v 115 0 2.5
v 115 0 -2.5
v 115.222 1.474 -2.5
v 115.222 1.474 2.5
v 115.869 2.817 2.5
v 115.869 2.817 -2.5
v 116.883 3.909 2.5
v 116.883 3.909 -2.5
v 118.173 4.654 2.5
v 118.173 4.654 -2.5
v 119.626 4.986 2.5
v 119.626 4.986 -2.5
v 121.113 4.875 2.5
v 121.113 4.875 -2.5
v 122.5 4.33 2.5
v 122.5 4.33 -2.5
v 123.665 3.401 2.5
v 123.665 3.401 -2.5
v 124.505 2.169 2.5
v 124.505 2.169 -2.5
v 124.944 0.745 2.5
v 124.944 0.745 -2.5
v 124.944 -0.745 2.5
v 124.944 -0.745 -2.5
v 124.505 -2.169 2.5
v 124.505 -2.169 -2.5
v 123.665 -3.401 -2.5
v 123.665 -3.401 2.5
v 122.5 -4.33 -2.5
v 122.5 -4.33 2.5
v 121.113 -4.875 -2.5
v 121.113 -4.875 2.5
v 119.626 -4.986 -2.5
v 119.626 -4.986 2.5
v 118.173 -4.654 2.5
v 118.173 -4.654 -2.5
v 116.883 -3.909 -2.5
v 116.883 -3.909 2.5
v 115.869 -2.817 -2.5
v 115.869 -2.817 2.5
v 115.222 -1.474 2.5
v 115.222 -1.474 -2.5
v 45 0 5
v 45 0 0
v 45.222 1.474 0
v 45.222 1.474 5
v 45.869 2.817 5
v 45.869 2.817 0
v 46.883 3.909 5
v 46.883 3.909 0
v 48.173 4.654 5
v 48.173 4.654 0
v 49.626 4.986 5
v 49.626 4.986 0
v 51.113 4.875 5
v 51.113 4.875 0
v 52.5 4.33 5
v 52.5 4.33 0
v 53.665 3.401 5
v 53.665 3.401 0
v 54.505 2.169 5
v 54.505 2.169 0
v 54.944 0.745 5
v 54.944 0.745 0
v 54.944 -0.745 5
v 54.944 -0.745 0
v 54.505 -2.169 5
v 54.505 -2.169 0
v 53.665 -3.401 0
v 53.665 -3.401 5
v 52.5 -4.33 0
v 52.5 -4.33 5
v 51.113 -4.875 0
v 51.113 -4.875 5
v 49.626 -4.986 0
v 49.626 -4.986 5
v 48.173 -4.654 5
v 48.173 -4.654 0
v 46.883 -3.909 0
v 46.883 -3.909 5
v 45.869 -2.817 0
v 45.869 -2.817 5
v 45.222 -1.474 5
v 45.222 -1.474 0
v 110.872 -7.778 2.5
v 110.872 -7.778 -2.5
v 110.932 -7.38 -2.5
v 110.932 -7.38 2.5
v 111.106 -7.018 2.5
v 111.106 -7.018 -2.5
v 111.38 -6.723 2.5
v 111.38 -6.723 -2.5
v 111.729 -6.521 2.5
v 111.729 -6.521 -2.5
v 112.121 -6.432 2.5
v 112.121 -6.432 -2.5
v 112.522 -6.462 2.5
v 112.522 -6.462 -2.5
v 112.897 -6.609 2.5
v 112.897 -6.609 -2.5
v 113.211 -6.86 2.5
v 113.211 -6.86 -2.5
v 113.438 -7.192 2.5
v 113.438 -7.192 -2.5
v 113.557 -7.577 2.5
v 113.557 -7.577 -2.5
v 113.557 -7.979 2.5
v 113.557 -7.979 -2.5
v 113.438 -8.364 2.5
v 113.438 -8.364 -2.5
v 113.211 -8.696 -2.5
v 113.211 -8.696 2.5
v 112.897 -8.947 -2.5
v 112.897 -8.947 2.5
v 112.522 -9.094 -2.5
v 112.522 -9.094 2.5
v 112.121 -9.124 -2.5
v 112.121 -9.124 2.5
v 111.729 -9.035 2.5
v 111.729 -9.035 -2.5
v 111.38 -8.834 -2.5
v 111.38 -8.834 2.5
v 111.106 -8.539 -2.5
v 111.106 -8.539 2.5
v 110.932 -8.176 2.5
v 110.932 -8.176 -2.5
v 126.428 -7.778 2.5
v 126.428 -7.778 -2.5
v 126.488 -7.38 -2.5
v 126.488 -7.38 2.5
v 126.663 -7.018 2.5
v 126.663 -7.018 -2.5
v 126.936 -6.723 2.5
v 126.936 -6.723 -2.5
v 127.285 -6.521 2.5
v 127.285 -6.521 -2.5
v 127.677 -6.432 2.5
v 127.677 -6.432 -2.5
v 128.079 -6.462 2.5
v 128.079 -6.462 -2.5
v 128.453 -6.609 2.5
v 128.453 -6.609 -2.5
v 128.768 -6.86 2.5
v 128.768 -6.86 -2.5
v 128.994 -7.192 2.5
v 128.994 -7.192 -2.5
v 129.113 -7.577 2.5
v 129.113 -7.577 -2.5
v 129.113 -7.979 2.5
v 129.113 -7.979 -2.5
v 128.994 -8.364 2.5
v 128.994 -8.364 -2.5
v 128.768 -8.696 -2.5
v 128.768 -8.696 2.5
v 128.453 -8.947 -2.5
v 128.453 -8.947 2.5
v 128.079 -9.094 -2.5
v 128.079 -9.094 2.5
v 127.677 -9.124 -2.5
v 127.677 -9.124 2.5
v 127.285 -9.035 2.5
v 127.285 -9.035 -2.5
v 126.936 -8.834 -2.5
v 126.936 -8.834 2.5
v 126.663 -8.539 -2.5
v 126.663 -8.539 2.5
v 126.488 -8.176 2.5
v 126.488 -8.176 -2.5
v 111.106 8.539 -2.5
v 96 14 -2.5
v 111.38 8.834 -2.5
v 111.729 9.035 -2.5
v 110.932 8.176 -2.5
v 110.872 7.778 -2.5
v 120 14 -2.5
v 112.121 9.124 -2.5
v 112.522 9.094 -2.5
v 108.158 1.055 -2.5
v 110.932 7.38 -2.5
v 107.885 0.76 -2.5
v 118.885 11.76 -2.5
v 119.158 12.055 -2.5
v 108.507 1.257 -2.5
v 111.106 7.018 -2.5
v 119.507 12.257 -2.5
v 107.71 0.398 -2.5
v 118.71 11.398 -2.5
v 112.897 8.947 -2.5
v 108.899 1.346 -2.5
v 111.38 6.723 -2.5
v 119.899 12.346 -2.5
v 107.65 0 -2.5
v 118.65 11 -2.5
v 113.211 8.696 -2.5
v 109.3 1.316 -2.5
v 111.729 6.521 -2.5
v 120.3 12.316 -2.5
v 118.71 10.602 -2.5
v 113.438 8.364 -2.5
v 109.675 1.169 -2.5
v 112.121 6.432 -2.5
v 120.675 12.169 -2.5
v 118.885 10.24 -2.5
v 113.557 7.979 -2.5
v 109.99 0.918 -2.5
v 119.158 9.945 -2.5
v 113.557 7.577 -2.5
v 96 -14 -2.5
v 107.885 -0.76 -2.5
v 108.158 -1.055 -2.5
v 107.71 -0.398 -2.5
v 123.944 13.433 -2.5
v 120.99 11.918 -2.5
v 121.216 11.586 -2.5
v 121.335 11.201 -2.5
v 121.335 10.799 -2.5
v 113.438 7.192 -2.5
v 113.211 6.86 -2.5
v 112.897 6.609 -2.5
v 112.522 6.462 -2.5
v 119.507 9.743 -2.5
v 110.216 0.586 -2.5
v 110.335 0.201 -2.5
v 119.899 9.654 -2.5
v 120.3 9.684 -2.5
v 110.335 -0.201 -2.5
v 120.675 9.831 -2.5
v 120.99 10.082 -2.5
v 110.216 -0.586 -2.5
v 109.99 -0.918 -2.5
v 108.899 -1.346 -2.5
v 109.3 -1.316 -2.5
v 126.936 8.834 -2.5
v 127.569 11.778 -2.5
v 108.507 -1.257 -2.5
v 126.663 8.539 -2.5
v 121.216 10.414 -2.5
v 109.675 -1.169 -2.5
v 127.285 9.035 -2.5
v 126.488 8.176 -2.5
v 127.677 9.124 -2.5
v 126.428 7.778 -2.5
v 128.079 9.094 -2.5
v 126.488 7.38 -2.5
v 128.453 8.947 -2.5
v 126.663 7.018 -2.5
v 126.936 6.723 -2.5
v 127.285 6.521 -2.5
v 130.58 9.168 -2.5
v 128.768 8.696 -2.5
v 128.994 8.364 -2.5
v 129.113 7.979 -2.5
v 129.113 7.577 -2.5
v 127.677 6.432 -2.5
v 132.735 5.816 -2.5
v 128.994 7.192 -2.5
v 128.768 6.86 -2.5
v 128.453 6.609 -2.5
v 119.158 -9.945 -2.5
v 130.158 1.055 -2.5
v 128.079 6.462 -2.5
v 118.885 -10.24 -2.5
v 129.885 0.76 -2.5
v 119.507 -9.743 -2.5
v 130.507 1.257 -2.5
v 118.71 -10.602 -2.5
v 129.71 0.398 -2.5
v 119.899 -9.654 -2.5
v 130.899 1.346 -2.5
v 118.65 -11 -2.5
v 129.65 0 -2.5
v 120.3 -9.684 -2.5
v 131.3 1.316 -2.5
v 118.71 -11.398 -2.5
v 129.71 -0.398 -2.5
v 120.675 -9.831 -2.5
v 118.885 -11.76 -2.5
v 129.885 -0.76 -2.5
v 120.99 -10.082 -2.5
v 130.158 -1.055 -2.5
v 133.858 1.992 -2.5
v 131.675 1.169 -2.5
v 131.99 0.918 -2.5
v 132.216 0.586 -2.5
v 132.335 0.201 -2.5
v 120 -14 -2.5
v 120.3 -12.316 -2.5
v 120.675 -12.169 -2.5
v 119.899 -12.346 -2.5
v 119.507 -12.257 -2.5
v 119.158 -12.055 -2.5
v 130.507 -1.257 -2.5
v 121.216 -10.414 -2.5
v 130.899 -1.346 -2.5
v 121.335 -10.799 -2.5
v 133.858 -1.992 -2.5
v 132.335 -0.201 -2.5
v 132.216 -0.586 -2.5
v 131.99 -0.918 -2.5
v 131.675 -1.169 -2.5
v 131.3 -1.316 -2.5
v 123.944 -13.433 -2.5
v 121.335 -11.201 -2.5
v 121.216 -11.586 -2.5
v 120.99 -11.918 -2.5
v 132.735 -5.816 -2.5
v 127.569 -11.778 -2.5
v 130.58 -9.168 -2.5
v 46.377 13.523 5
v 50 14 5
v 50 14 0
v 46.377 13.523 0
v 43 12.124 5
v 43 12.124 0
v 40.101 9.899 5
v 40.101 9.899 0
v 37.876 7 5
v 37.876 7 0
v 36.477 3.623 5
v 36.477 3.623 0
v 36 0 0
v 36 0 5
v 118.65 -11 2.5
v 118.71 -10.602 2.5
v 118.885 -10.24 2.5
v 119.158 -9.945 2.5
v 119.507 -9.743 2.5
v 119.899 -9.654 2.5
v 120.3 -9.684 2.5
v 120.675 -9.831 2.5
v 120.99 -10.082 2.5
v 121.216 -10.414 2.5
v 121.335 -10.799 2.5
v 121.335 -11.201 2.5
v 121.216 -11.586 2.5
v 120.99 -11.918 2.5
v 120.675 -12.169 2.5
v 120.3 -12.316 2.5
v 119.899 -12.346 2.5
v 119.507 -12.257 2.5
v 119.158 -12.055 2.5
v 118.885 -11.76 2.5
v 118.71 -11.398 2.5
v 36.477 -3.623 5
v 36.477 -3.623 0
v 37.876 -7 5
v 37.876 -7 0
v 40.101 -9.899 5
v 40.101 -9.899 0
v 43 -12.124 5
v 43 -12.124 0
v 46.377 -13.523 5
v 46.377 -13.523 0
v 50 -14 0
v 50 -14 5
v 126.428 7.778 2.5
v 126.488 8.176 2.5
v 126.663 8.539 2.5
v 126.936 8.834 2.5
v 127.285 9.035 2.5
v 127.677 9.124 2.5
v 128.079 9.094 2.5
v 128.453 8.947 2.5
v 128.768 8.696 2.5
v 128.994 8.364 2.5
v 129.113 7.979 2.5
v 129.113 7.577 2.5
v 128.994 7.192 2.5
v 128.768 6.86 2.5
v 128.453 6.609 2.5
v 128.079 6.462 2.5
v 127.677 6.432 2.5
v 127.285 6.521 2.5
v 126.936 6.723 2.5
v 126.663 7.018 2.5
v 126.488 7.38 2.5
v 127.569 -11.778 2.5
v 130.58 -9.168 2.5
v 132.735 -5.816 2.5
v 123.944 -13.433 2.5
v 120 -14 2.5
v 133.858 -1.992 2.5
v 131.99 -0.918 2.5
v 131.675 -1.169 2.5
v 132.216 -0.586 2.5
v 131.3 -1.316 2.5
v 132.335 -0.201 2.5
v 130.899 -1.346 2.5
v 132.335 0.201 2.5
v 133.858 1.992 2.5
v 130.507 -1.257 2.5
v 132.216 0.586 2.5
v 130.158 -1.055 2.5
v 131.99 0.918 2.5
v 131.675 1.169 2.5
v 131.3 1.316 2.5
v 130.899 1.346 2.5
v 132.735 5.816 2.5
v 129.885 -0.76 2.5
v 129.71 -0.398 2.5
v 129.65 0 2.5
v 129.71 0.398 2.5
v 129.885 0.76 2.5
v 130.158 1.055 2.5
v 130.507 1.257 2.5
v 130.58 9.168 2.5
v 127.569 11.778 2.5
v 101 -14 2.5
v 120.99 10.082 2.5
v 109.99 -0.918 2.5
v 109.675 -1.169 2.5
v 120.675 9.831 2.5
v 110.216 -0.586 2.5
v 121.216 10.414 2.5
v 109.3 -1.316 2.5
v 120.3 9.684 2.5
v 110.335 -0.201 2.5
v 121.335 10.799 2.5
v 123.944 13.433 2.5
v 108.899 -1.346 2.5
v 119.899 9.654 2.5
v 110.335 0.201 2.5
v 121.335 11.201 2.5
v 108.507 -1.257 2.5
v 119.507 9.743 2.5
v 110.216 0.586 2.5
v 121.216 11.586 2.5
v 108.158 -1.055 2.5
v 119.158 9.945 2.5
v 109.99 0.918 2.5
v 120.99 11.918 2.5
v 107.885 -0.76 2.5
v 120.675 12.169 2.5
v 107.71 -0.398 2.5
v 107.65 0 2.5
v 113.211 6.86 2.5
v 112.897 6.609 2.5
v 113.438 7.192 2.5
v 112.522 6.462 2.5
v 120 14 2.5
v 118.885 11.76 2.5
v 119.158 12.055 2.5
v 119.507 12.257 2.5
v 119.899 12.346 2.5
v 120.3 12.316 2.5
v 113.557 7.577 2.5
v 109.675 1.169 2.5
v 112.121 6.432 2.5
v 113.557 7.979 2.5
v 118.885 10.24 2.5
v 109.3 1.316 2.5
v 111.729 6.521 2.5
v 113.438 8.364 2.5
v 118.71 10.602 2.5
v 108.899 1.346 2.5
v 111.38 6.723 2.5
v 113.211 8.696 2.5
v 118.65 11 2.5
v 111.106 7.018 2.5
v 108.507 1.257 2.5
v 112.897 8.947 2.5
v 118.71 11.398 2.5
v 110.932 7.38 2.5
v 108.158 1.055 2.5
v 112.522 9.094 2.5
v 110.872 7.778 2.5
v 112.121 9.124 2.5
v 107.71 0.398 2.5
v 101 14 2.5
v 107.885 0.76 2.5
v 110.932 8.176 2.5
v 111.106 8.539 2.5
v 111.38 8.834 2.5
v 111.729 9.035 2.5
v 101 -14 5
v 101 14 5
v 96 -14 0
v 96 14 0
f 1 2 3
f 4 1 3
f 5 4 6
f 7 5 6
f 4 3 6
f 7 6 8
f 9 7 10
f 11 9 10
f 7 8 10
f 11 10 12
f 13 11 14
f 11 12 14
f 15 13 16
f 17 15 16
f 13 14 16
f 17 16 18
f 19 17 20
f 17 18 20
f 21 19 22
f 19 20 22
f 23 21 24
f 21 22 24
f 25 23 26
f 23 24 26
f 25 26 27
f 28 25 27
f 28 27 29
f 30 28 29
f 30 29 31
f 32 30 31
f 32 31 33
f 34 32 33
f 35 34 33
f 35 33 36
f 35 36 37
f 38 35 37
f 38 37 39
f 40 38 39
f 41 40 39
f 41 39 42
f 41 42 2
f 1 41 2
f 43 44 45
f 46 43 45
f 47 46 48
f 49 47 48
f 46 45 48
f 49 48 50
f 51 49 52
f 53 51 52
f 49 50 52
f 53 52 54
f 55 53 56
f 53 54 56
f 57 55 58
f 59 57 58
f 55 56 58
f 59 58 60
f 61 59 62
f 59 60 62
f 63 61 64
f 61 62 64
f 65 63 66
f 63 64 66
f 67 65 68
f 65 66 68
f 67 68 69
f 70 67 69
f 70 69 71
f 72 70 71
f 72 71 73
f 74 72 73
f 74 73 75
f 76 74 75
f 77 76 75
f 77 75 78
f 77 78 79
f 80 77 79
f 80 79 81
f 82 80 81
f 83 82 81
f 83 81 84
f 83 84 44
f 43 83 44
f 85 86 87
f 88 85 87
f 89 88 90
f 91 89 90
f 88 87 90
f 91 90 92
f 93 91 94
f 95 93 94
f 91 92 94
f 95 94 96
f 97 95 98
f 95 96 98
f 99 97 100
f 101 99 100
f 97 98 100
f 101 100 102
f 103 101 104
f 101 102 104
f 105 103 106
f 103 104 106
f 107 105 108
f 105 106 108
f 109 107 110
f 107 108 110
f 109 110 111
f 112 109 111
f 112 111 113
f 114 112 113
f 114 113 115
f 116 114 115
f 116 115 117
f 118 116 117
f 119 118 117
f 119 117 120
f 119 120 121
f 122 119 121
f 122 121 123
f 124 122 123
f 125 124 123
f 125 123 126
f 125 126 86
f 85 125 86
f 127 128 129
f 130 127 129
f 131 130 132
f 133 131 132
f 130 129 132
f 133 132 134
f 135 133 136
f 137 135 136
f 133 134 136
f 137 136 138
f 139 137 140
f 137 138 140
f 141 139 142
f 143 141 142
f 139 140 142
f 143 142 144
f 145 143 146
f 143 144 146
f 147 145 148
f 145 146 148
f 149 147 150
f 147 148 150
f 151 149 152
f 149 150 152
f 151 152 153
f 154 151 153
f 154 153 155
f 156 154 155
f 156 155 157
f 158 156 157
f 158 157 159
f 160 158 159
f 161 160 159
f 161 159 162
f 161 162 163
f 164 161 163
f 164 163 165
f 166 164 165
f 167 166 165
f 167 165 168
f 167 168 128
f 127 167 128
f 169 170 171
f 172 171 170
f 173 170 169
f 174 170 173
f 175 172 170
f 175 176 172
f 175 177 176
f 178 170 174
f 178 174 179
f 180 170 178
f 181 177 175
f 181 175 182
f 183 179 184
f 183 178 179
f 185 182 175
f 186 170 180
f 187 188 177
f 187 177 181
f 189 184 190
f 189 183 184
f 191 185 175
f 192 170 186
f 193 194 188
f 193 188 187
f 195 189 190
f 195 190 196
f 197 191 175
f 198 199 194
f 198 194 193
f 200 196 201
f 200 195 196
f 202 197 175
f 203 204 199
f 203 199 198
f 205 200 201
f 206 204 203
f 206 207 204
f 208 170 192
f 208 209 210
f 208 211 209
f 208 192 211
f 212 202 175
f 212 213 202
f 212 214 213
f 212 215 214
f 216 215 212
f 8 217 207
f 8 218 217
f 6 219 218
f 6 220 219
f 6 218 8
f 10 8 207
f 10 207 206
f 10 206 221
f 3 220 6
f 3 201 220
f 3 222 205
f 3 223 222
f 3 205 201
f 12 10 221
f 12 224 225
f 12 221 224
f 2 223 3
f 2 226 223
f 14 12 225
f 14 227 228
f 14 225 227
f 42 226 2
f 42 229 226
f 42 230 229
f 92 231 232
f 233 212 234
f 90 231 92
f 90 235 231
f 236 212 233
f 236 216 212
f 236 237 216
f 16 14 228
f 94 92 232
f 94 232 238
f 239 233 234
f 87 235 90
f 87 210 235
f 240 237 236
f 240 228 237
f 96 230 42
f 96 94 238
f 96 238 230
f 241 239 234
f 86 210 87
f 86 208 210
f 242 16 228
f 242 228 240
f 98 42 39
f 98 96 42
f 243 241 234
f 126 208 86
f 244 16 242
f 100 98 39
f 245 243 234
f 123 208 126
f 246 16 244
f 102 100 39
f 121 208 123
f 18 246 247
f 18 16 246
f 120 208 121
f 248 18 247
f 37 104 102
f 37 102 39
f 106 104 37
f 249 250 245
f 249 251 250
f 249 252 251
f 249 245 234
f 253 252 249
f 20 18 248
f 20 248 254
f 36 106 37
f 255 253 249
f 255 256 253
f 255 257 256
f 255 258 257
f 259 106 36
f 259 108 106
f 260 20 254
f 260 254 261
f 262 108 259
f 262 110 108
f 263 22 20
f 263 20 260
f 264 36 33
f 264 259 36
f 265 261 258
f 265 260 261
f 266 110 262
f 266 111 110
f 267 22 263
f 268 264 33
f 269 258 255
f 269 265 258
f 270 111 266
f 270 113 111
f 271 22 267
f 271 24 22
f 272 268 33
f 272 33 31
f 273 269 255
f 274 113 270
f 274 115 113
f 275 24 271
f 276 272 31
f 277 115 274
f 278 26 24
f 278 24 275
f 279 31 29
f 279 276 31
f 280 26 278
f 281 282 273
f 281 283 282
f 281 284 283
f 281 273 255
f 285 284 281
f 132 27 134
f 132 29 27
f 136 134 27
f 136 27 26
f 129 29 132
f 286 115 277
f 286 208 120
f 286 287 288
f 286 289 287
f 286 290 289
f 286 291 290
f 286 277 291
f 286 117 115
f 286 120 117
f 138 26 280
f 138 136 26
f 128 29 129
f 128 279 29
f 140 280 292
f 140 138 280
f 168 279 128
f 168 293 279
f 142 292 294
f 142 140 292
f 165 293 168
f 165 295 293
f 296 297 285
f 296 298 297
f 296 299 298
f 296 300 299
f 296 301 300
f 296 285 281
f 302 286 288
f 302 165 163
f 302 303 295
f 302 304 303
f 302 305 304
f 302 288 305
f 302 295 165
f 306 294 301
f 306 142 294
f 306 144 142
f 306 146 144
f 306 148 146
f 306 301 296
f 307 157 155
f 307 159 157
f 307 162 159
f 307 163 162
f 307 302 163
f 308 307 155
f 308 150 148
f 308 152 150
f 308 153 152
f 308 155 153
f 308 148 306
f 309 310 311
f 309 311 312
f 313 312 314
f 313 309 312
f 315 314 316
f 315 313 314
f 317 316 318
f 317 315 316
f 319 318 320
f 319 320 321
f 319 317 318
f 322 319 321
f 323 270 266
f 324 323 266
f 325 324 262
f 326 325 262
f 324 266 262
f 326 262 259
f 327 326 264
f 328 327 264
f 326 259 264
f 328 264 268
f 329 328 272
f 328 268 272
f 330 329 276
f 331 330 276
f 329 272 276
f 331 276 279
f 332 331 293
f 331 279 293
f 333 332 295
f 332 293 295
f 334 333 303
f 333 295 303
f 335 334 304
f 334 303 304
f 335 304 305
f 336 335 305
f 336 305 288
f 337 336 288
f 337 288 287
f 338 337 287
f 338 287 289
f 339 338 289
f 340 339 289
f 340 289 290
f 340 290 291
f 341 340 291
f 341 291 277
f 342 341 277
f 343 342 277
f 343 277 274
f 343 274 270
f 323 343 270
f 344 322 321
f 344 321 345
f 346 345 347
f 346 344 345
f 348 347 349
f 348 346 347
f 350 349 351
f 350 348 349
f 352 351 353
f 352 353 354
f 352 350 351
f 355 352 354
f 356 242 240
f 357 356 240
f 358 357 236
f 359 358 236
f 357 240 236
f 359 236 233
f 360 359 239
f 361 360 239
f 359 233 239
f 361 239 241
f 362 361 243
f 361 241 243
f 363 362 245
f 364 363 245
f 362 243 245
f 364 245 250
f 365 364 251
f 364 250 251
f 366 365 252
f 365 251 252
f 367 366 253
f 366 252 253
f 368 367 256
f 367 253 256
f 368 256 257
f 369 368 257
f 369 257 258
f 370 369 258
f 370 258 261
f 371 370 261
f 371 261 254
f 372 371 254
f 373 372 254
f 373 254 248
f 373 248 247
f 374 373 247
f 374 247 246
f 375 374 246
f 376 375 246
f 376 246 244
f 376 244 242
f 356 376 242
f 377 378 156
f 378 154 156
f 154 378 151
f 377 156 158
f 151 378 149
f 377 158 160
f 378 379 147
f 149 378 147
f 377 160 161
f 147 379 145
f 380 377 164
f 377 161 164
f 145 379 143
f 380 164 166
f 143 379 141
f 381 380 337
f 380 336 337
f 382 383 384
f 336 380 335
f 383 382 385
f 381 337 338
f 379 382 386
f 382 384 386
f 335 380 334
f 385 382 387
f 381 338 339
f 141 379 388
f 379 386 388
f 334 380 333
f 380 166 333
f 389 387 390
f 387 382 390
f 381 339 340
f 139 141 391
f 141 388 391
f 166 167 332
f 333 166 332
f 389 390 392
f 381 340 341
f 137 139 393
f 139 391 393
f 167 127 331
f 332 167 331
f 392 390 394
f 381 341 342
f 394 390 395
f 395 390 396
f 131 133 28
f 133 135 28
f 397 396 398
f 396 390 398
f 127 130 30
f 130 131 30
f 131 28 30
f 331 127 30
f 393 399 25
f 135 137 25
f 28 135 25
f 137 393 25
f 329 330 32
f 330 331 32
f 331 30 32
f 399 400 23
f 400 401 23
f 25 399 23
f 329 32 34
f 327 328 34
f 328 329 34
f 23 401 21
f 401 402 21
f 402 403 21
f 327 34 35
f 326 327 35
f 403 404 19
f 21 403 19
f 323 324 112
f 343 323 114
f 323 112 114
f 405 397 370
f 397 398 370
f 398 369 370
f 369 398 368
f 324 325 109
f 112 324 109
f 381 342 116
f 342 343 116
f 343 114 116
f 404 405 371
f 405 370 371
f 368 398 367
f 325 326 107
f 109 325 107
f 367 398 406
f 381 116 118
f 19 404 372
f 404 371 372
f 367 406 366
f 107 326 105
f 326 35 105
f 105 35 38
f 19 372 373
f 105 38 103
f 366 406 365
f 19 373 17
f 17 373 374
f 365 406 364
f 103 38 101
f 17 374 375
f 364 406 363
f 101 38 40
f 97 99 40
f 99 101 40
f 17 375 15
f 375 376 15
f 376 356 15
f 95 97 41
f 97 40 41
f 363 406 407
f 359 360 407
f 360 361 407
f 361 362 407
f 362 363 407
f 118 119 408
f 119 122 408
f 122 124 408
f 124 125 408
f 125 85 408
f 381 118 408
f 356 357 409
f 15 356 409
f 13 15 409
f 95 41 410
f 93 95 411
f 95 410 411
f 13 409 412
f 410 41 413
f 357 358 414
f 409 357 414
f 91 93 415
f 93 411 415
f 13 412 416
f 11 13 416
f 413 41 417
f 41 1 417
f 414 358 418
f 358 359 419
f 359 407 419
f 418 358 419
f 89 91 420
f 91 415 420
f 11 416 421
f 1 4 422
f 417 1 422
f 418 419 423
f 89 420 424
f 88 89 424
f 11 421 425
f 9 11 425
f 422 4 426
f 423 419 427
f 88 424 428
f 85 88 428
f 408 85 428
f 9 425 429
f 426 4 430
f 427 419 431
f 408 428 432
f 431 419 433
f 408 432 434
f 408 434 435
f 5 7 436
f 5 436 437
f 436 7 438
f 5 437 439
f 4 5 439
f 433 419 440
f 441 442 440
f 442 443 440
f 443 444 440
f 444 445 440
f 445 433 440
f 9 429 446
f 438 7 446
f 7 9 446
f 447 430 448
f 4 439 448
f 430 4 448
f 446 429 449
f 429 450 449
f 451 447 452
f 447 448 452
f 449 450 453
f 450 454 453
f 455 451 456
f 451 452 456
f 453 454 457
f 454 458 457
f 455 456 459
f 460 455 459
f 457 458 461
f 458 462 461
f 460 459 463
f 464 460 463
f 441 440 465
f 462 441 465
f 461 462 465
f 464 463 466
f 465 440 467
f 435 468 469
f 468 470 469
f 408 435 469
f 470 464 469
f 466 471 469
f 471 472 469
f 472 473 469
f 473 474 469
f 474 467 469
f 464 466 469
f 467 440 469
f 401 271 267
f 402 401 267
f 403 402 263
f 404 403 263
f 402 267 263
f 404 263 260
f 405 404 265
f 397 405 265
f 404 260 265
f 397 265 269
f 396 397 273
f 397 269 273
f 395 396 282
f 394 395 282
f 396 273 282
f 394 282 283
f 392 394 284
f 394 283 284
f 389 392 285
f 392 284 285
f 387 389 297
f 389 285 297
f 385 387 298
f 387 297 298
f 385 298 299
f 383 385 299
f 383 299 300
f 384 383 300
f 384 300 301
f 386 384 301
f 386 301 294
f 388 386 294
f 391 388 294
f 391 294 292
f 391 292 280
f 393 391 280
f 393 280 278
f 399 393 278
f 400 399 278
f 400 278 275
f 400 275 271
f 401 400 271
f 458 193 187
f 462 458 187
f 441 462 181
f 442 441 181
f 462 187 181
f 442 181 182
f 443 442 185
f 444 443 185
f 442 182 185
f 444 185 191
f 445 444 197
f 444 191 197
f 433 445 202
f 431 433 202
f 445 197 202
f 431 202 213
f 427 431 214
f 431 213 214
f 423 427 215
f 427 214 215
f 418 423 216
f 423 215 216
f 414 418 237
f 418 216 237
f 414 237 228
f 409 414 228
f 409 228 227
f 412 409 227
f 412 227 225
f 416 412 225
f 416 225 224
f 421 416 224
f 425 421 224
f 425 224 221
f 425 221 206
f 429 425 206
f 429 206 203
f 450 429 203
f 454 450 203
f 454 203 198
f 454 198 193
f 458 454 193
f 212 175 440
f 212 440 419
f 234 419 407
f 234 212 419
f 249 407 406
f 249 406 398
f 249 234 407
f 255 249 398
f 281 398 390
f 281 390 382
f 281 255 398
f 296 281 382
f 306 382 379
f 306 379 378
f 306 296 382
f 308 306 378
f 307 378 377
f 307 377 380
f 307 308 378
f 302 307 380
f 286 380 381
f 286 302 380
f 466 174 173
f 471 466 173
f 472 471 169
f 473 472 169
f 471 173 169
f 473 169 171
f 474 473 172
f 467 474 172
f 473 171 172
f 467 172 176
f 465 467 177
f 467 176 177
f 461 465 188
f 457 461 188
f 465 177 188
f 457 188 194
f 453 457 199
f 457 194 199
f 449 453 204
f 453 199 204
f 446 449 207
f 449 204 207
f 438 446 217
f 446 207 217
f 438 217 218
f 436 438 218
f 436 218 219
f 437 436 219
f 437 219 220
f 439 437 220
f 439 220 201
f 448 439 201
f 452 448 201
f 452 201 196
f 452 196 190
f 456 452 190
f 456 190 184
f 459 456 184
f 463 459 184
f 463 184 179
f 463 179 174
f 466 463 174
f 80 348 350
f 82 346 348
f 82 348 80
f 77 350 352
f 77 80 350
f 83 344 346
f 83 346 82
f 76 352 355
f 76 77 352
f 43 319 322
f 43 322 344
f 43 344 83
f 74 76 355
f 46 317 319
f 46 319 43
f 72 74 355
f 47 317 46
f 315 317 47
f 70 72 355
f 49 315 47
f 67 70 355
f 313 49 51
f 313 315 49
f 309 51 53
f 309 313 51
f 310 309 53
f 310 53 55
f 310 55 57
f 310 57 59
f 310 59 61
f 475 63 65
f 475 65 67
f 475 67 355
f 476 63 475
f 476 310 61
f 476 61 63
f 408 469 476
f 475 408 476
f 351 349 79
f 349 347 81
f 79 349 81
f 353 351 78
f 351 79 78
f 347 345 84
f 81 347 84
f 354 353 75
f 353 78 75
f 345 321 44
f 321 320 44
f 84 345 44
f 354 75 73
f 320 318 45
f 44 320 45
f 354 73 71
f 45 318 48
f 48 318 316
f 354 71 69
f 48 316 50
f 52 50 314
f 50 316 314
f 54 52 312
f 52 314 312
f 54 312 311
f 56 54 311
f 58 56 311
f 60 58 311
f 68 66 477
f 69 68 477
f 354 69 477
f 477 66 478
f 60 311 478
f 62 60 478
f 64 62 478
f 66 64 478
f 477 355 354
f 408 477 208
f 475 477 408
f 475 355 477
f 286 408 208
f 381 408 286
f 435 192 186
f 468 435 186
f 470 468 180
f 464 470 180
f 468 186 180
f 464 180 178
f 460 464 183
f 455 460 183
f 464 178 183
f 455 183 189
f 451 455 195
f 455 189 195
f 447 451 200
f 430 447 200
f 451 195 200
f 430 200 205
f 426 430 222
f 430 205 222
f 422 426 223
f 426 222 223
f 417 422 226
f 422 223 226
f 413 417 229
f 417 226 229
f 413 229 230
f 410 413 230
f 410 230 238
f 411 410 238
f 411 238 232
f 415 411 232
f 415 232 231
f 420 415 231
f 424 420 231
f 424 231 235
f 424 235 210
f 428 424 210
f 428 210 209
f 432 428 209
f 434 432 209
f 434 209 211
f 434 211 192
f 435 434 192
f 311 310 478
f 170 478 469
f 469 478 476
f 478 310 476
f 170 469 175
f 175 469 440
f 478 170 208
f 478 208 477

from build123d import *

# Parameters (mm, degrees)
RESSALTO_EXTRUS_O1_DEPTH   = 5
ESBO_O2_R                  = 1.35
ESBO_O2_R_2                = 1.373066436
ESBO_O2_R_3                = 1.330065432
ESBO_O2_R_4                = 5
CORTE_EXTRUS_O1_DEPTH      = 137.810087347
ESBO_O3_R                  = 5
CORTE_EXTRUS_O2_DEPTH      = 137.810087347
ESBO_O5_W                  = 31.24115408
ESBO_O5_H                  = 28
CORTE_EXTRUS_O3_DEPTH      = 137.810087347
ESBO_O6_W                  = 5
ESBO_O6_H                  = 28
RESSALTO_EXTRUS_O2_DEPTH   = 2.5
RESSALTO_EXTRUS_O4_DEPTH   = 5
ESBO_O8_R                  = 5
ESBO_O8_R_2                = 1.35
CORTE_EXTRUS_O4_DEPTH      = 135.937948702
ESBO_O10_W                 = 5
ESBO_O10_H                 = 2.5
CORTE_EXTRUS_O5_DEPTH      = 137.985400682
ESBO_O11_W                 = 5
ESBO_O11_H                 = 2.5
RESSALTO_EXTRUS_O5_DEPTH   = 28
ESBO_O14_W                 = 51.545841804
ESBO_O14_H                 = 28
CORTE_EXTRUS_O6_DEPTH      = 10
CORTE_EXTRUS_O7_DEPTH      = 135.822105012
CORTE_EXTRUS_O7_DEPTH_BACK = 10
ESBO_O16_R                 = 5
CORTE_EXTRUS_O8_DEPTH      = 10


with BuildPart() as part:
    # Esboço1 → Ressalto-extrusão1 (new body)
    with BuildSketch(Plane.XY):
        with BuildLine():
            Line((0, -14), (122, -14))
            ThreePointArc((122, -14), (136, 0), (122, 14))
            Line((122, 14), (0, 14))
            ThreePointArc((0, 14), (-14, 0), (0, -14))
        make_face()
    extrude(amount=RESSALTO_EXTRUS_O1_DEPTH)

    # Esboço2 → Corte-extrusão1 (cut, through all)
    with BuildSketch(Plane(origin=(0, 0, 0), x_dir=(-1, 0, 0), z_dir=(0, 0, -1))):
        with Locations((-125.327123404, 10.484762747)):
            Circle(ESBO_O2_R)
        with Locations((-116.938784683, 9.766478358)):
            Circle(ESBO_O2_R)
        with Locations((-111.515237253, 3.327123404)):
            Circle(ESBO_O2_R)
        with Locations((-112.233521642, -5.061215317)):
            Circle(ESBO_O2_R)
        with Locations((-118.672876596, -10.484762747)):
            Circle(ESBO_O2_R_2)
        with Locations((-127.061215317, -9.766478358)):
            Circle(ESBO_O2_R_3)
        with Locations((-132.484762747, -3.327123404)):
            Circle(ESBO_O2_R)
        with Locations((-131.766478358, 5.061215317)):
            Circle(ESBO_O2_R)
        with Locations((-122, 0)):
            Circle(ESBO_O2_R_4)
    extrude(amount=-CORTE_EXTRUS_O1_DEPTH, mode=Mode.SUBTRACT)

    # Esboço3 → Corte-extrusão2 (cut, through all)
    with BuildSketch(Plane(origin=(0, 0, 0), x_dir=(-1, 0, 0), z_dir=(0, 0, -1))):
        Circle(ESBO_O3_R)
    extrude(amount=-CORTE_EXTRUS_O2_DEPTH, mode=Mode.SUBTRACT)

    # Esboço5 → Corte-extrusão3 (cut, through all)
    with BuildSketch(Plane(origin=(0, 0, 0), x_dir=(-1, 0, 0), z_dir=(0, 0, -1))):
        with Locations((-121.62057704, 0)):
            Rectangle(ESBO_O5_W, ESBO_O5_H)
    extrude(amount=-CORTE_EXTRUS_O3_DEPTH, mode=Mode.SUBTRACT)

    # Esboço6 → Ressalto-extrusão2 (add)
    with BuildSketch(Plane(origin=(0, 0, 0), x_dir=(-1, 0, 0), z_dir=(0, 0, -1))):
        with Locations((-103.5, 0)):
            Rectangle(ESBO_O6_W, ESBO_O6_H)
    extrude(amount=RESSALTO_EXTRUS_O2_DEPTH)

    # Esboço7 → Ressalto-extrusão4 (add)
    with BuildSketch(Plane(origin=(0, 0, -2.5), x_dir=(-1, 0, 0), z_dir=(0, 0, -1))):
        with BuildLine():
            Line((-106, 14), (-120, 14))
            ThreePointArc((-120, 14), (-134, 0), (-120, -14))
            Line((-120, -14), (-106, -14))
            Line((-106, -14), (-106, 14))
        make_face()
    extrude(amount=-RESSALTO_EXTRUS_O4_DEPTH)

    # Esboço8 → Corte-extrusão4 (cut, through all)
    with BuildSketch(Plane(origin=(0, 0, -2.5), x_dir=(-1, 0, 0), z_dir=(0, 0, -1))):
        with Locations((-120, 0)):
            Circle(ESBO_O8_R)
        with Locations((-120, 11)):
            Circle(ESBO_O8_R_2)
        with Locations((-109, 0)):
            Circle(ESBO_O8_R_2)
        with Locations((-120, -11)):
            Circle(ESBO_O8_R_2)
        with Locations((-131, 0)):
            Circle(ESBO_O8_R_2)
        with Locations((-112.221825407, 7.778174593)):
            Circle(ESBO_O8_R_2)
        with Locations((-112.221825407, -7.778174593)):
            Circle(ESBO_O8_R_2)
        with Locations((-127.778174593, -7.778174593)):
            Circle(ESBO_O8_R_2)
        with Locations((-127.778174593, 7.778174593)):
            Circle(ESBO_O8_R_2)
    extrude(amount=-CORTE_EXTRUS_O4_DEPTH, mode=Mode.SUBTRACT)

    # Esboço10 → Corte-extrusão5 (cut, through all)
    with BuildSketch(Plane.XZ.offset(14)):
        with Locations((103.5, 3.75)):
            Rectangle(ESBO_O10_W, ESBO_O10_H)
    extrude(amount=-CORTE_EXTRUS_O5_DEPTH, mode=Mode.SUBTRACT)

    # Esboço11 → Ressalto-extrusão5 (add, through all)
    with BuildSketch(Plane.XZ.offset(14)):
        with Locations((98.5, -1.25)):
            Rectangle(ESBO_O11_W, ESBO_O11_H)
    extrude(amount=-RESSALTO_EXTRUS_O5_DEPTH)

    # Esboço14 → Corte-extrusão6 (cut)
    with BuildSketch(Plane(origin=(0, 0, 0), x_dir=(-1, 0, 0), z_dir=(0, 0, -1))):
        with Locations((-10.227079098, 0)):
            Rectangle(ESBO_O14_W, ESBO_O14_H)
    extrude(amount=-CORTE_EXTRUS_O6_DEPTH, mode=Mode.SUBTRACT)

    # Esboço15 → Corte-extrusão7 (cut, two sides: drawn at the far end of the back side and taken through both)
    with BuildSketch(Plane(origin=(0, 0, 0), x_dir=(-1, 0, 0), z_dir=(0, 0, -1)).offset(-CORTE_EXTRUS_O7_DEPTH_BACK)):
        with BuildLine():
            Line((-36, 14), (-50, 14))
            ThreePointArc((-50, 14), (-40.100505063, 9.899494937), (-36, 0))
            Line((-36, 0), (-36, 14))
        make_face()
        with BuildLine():
            Line((-36, -14), (-36, 0))
            ThreePointArc((-36, 0), (-40.100505063, -9.899494937), (-50, -14))
            Line((-50, -14), (-36, -14))
        make_face()
    extrude(amount=CORTE_EXTRUS_O7_DEPTH + CORTE_EXTRUS_O7_DEPTH_BACK, mode=Mode.SUBTRACT)

    # Esboço16 → Corte-extrusão8 (cut)
    with BuildSketch(Plane(origin=(0, 0, 0), x_dir=(-1, 0, 0), z_dir=(0, 0, -1))):
        with Locations((-50, 0)):
            Circle(ESBO_O16_R)
    extrude(amount=-CORTE_EXTRUS_O8_DEPTH, mode=Mode.SUBTRACT)


solid = part.part
